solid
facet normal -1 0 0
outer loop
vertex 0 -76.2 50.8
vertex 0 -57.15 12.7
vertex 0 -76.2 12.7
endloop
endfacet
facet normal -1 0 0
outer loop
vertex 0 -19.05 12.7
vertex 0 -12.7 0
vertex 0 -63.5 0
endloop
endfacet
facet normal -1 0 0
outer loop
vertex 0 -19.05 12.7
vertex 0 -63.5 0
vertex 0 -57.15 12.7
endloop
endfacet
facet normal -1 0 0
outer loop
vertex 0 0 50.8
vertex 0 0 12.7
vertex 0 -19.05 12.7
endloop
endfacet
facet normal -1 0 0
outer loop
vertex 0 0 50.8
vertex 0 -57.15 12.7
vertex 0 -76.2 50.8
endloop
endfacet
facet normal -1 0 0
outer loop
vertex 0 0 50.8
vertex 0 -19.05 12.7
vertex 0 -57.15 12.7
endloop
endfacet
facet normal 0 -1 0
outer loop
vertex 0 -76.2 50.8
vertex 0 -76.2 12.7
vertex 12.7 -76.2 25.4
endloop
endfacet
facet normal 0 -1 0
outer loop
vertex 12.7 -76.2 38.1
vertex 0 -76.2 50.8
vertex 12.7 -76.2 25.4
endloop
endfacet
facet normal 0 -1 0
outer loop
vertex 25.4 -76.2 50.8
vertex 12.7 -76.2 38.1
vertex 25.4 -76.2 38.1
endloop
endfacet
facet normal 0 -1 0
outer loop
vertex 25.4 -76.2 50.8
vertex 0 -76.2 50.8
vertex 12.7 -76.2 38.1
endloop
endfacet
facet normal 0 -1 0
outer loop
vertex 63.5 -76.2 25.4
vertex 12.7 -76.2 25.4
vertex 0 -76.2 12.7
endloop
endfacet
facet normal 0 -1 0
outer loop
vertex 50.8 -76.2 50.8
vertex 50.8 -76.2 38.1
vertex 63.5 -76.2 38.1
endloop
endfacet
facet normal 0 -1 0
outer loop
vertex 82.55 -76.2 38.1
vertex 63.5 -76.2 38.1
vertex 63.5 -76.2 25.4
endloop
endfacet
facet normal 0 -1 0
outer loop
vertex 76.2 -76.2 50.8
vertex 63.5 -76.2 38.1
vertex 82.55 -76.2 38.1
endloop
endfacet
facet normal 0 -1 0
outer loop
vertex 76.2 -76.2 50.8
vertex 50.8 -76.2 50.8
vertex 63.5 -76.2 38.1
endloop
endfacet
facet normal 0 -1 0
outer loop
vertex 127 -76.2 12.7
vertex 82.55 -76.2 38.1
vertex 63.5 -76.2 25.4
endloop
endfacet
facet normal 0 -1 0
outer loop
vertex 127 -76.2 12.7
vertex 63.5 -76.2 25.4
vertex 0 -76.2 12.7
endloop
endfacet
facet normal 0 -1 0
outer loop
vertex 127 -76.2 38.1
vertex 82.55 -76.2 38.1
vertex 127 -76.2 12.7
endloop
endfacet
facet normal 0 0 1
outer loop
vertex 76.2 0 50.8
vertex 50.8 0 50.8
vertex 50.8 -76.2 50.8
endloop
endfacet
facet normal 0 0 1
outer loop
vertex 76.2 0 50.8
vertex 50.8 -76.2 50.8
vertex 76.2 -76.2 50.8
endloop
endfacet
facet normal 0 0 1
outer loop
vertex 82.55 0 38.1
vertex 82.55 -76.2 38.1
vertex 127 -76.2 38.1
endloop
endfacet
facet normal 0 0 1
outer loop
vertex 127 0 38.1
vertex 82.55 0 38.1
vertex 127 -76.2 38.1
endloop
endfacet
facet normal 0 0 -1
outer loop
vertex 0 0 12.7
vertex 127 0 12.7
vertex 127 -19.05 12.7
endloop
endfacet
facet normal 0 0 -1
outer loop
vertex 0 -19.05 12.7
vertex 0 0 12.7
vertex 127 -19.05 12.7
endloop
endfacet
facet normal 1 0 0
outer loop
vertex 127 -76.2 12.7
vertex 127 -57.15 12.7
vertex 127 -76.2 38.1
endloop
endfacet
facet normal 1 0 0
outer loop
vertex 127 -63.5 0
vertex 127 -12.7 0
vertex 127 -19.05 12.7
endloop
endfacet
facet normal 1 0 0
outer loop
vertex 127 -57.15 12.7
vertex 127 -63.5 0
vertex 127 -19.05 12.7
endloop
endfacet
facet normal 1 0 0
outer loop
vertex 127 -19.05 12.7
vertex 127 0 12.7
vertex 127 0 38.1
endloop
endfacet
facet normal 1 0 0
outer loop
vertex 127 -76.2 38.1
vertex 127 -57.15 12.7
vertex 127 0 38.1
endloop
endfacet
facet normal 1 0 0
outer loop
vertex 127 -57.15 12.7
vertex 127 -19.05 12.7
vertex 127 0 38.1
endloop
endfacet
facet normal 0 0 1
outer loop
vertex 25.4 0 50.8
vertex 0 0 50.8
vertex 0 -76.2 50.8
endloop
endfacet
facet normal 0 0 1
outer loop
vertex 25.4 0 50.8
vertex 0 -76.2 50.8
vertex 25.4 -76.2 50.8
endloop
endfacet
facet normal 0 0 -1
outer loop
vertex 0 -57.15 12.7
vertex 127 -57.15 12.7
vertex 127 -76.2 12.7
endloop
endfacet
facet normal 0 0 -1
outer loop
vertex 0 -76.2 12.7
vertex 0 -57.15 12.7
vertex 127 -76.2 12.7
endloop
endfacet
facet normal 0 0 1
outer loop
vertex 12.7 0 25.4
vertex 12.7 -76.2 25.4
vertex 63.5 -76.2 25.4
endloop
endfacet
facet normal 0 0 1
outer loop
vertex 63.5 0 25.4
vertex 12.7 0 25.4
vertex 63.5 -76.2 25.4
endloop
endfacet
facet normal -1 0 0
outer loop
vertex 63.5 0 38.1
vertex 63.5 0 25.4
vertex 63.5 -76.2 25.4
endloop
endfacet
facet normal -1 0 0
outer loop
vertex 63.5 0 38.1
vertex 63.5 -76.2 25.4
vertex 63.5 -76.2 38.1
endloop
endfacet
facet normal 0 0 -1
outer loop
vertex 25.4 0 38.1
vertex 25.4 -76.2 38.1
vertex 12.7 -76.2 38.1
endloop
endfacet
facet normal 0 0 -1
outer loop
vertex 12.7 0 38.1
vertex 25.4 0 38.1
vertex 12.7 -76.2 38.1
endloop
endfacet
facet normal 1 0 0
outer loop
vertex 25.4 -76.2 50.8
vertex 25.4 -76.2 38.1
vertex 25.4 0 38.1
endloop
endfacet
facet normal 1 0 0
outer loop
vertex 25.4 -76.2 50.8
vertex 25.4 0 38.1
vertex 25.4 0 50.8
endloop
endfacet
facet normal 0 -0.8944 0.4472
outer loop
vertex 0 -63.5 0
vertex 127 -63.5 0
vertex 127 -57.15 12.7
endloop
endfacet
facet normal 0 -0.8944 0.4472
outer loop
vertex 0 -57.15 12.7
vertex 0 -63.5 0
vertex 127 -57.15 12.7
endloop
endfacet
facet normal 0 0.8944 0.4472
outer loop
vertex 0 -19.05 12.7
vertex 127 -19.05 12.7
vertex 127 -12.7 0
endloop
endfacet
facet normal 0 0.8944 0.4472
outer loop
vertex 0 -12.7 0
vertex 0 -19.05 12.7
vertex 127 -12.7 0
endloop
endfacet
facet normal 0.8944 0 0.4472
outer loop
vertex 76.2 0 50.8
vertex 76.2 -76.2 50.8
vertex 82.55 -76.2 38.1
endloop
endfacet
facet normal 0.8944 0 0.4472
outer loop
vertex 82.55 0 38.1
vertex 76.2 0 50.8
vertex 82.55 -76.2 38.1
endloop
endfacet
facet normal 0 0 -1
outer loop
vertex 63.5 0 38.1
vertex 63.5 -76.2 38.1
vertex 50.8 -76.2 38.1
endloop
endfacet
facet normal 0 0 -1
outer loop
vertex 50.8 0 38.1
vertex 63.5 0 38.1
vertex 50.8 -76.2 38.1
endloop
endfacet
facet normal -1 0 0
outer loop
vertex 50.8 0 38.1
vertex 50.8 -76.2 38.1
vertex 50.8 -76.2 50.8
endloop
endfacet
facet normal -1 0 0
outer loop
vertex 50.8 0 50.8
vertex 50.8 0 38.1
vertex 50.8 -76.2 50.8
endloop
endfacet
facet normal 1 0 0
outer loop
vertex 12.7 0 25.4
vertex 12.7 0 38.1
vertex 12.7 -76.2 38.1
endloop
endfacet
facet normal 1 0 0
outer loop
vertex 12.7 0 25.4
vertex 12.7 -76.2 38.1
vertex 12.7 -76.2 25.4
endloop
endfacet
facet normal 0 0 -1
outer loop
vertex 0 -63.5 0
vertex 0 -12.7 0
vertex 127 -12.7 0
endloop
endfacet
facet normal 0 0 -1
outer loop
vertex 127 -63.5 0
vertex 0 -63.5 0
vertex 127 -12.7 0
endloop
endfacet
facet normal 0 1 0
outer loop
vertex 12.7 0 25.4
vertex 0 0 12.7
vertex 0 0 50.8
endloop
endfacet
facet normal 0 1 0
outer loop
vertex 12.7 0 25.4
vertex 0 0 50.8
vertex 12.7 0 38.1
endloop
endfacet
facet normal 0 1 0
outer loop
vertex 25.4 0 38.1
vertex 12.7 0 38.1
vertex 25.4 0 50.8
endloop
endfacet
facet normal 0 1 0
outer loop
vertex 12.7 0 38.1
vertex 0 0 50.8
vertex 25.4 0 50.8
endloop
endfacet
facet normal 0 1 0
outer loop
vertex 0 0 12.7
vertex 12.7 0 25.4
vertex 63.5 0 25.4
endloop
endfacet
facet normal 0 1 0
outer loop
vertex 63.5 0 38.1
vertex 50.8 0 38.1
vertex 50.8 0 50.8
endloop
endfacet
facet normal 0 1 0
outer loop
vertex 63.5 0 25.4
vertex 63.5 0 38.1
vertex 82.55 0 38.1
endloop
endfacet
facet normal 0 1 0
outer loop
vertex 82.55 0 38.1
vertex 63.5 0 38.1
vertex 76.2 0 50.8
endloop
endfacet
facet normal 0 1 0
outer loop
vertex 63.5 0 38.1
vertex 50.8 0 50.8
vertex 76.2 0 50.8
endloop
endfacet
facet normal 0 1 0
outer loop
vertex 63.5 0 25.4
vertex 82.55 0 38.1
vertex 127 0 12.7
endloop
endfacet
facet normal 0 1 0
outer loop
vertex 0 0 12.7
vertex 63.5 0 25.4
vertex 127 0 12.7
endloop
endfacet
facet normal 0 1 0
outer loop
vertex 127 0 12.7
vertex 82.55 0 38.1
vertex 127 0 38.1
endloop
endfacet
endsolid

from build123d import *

# Parameters (mm, degrees)
F0_W     = 127
F0_H     = 50.8
F1_DEPTH = 76.2
F2_W     = 25.4
F2_H     = 12.7
F3_DEPTH = 76.2
F5_DEPTH = 76.2
F7_DEPTH = 127


with BuildPart() as f1:
    # F0 (on Front) → F1 (new body)
    with BuildSketch(Plane.XZ):
        with Locations((63.5, 25.4)):
            Rectangle(F0_W, F0_H)
    extrude(amount=F1_DEPTH)

    # F2 (on face) → F3 (cut)
    with BuildSketch(Plane.XZ.offset(76.2)):
        Polygon((12.7, 38.1), (12.7, 25.4), (63.5, 25.4), (63.5, 38.1), (50.8, 38.1), (25.4, 38.1), align=None)
        with Locations((38.1, 44.45)):
            Rectangle(F2_W, F2_H)
    extrude(amount=-F3_DEPTH, mode=Mode.SUBTRACT)

    # F4 (on face) → F5 (cut)
    with BuildSketch(Plane.XZ.offset(76.2)):
        Polygon((127, 50.8), (76.2, 50.8), (82.55, 38.1), (127, 38.1), align=None)
    extrude(amount=-F5_DEPTH, mode=Mode.SUBTRACT)

    # F6 (on face) → F7 (cut)
    with BuildSketch(Plane.YZ.offset(127)):
        Polygon((-57.15, 12.7), (-76.2, 12.7), (-76.2, 0), (-63.5, 0), align=None)
        Polygon((0, 0), (0, 12.7), (-19.05, 12.7), (-12.7, 0), align=None)
    extrude(amount=-F7_DEPTH, mode=Mode.SUBTRACT)


solid = f1.part
